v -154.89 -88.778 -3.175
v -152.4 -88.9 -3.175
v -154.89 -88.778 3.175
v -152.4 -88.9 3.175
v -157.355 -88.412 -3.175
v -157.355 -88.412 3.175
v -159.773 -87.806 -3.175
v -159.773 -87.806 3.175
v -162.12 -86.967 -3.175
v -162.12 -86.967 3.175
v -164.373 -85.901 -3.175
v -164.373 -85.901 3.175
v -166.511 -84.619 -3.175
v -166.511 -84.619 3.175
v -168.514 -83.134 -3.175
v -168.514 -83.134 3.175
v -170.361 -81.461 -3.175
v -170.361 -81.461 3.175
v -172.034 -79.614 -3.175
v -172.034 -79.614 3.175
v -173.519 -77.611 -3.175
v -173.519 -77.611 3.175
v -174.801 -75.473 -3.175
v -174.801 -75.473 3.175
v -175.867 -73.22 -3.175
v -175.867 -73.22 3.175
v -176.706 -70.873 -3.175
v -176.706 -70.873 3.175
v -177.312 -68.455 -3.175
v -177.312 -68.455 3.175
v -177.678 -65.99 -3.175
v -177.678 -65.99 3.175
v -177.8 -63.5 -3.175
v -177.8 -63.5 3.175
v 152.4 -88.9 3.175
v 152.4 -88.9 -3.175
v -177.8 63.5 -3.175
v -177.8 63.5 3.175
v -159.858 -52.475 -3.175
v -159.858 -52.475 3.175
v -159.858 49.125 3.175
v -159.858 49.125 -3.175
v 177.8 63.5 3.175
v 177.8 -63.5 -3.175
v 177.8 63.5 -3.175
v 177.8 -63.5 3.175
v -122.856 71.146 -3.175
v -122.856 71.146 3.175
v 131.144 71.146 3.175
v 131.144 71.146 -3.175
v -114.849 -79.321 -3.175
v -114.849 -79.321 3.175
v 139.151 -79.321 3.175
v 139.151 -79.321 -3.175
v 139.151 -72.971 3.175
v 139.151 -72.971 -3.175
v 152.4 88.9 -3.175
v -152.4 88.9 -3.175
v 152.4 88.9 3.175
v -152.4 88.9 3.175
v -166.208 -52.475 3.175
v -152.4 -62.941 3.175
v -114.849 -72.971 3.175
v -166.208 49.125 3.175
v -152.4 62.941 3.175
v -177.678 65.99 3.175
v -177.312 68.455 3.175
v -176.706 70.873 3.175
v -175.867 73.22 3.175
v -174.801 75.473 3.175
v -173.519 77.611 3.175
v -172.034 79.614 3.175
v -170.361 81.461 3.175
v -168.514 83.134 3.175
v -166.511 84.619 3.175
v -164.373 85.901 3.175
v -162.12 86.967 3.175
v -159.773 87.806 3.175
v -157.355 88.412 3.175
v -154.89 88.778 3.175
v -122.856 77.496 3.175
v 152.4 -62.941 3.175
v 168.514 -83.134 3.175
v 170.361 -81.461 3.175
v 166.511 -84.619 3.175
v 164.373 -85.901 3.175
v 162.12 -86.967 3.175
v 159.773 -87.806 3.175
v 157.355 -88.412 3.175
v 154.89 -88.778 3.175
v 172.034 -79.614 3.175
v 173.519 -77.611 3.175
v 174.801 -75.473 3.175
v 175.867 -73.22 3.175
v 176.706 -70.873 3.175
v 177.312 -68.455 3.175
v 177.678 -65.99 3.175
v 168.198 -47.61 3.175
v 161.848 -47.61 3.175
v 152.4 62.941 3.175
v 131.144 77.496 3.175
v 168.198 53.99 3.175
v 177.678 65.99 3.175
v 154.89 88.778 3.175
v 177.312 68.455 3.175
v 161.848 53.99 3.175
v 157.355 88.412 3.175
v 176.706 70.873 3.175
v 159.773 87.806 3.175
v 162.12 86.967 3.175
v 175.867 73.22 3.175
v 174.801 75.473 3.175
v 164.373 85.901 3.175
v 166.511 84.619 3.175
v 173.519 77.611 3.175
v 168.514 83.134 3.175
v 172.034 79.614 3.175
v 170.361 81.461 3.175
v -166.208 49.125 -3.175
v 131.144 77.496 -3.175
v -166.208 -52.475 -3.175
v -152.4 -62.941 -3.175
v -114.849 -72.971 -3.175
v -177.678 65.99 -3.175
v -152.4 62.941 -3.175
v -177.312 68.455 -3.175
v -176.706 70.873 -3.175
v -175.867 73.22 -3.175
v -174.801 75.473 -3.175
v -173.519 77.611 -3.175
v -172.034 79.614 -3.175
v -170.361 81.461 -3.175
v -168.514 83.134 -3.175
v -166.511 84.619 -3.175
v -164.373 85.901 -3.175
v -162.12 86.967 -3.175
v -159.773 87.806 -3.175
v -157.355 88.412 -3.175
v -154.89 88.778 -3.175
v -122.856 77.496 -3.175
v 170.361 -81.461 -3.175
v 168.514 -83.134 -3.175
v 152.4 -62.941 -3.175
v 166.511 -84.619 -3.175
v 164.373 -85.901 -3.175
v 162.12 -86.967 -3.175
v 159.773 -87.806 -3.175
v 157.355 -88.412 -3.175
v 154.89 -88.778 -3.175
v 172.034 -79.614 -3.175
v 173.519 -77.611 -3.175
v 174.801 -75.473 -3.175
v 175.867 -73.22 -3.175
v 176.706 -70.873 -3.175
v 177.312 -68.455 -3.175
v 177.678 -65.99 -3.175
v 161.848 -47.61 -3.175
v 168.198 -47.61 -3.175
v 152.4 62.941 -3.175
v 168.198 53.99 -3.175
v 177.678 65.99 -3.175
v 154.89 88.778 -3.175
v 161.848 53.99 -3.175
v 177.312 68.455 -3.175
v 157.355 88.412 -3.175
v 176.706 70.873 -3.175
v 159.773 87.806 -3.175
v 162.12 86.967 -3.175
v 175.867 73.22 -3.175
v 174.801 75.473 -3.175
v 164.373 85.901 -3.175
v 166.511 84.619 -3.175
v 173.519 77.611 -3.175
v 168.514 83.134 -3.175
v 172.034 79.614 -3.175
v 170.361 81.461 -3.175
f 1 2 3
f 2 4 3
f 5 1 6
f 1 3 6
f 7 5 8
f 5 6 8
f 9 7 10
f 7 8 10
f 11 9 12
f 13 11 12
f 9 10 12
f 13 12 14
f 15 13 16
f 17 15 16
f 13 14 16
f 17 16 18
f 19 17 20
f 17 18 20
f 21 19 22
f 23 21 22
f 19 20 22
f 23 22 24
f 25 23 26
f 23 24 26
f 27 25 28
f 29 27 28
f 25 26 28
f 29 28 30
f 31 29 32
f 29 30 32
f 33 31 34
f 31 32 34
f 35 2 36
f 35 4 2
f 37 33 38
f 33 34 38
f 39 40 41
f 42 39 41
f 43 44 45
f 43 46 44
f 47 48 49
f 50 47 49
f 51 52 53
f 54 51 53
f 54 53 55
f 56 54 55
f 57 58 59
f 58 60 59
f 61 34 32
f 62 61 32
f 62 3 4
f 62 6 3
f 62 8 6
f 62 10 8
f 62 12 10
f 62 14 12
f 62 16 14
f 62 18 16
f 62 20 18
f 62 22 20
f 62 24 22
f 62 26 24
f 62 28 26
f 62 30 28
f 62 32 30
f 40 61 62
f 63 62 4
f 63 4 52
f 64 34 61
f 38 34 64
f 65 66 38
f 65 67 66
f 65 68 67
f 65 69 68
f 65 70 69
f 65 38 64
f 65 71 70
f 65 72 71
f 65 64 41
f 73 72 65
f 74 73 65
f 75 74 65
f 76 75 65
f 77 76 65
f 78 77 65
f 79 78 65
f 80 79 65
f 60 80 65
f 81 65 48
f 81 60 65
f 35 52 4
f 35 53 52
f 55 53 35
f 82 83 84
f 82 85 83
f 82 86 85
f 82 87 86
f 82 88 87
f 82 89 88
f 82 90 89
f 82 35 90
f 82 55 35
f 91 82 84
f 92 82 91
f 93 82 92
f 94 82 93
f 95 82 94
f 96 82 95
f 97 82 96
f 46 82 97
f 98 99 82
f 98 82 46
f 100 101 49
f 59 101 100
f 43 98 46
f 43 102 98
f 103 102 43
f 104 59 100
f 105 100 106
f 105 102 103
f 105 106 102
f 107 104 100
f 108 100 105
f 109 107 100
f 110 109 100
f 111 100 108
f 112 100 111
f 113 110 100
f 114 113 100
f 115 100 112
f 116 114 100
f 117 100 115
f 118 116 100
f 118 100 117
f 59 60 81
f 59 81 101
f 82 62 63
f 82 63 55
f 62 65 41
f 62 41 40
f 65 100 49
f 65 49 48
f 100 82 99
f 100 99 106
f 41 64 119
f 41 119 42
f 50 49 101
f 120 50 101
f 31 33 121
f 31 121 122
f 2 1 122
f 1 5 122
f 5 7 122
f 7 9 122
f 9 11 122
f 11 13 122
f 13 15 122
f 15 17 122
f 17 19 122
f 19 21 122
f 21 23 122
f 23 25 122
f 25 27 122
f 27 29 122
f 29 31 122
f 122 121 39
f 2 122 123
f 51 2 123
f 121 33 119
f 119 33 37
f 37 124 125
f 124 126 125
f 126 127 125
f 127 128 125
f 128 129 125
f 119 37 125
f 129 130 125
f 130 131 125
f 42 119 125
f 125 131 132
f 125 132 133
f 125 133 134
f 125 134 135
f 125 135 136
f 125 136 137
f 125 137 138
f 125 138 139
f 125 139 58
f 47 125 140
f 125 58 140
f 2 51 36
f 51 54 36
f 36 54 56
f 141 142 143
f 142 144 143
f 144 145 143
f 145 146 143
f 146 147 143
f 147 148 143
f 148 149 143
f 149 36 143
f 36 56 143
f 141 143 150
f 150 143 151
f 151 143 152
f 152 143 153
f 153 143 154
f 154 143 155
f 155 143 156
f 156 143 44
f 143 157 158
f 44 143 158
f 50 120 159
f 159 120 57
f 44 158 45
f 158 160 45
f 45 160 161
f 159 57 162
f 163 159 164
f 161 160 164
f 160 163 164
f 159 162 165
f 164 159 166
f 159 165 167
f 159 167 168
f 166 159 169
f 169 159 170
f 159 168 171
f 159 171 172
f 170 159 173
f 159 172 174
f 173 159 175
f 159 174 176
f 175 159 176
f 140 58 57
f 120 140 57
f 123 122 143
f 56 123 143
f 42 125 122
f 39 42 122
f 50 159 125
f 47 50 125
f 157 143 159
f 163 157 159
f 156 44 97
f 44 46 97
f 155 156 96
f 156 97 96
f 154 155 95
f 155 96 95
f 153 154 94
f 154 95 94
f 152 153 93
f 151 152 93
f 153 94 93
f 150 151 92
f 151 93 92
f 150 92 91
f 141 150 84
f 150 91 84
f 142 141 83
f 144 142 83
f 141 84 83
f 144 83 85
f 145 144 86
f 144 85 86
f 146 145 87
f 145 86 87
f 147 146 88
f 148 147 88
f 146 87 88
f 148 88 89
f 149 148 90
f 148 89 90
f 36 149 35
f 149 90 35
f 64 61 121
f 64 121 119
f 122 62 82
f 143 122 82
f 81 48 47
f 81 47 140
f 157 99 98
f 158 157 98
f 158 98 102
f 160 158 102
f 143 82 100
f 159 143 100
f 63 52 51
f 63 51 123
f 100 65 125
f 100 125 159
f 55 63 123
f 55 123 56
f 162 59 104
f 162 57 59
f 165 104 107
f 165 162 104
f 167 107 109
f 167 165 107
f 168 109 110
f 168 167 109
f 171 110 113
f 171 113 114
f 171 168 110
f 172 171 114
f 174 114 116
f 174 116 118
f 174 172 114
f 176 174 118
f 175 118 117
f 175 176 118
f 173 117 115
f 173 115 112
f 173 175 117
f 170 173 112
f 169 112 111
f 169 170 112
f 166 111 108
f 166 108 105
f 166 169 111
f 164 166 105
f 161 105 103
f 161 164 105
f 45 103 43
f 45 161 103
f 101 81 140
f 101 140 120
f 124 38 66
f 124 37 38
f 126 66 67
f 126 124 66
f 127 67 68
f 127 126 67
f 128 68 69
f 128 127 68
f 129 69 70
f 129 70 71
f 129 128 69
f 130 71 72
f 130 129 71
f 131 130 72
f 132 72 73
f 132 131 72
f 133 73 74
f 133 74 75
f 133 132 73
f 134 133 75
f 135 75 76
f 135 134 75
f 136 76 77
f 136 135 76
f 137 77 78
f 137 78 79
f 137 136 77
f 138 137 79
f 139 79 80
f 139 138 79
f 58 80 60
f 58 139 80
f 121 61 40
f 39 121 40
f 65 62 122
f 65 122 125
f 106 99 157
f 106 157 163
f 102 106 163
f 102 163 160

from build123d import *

# Parameters (mm, degrees)
F0_W      = 304.8
F0_H      = 125.8824
F1_DEPTH  = 3.175
F2_W      = 355.6
F2_H      = 177.8
F3_DEPTH  = 3.175
F4_DEPTH  = 12.7
F5_R      = 25.4
F6_R      = 25.4
F7_R      = 25.4
F8_R      = 25.4
F9_W      = 254
F9_H      = 6.35
F10_DEPTH = 12.7
F11_W     = 254
F11_H     = 6.35
F12_DEPTH = 12.7
F13_W     = 6.35
F13_H     = 101.6
F14_DEPTH = 12.7
F15_W     = 6.35
F15_H     = 101.6
F16_DEPTH = 12.7


with BuildPart() as f1:
    # F0 (on Top) → F1 (new body, symmetric)
    with BuildSketch(Plane.XY):
        Rectangle(F0_W, F0_H)
    extrude(amount=F1_DEPTH, both=True)

    # F2 (on Top) → F3 (join, symmetric)
    with BuildSketch(Plane.XY):
        Rectangle(F2_W, F2_H)
    extrude(amount=F3_DEPTH, both=True)

    # F0 (on Top) → F4 (cut, symmetric)
    with BuildSketch(Plane.XY):
        Rectangle(F0_W, F0_H)
    extrude(amount=F4_DEPTH, both=True, mode=Mode.SUBTRACT)

    # F5
    f5_edges = [f1.edges().sort_by_distance(p)[0] for p in [
        (-177.8, 88.9, 0),
    ]]
    fillet(f5_edges, radius=F5_R)

    # F6
    f6_edges = [f1.edges().sort_by_distance(p)[0] for p in [
        (177.8, 88.9, 0),
    ]]
    fillet(f6_edges, radius=F6_R)

    # F7
    f7_edges = [f1.edges().sort_by_distance(p)[0] for p in [
        (177.8, -88.9, 0),
    ]]
    fillet(f7_edges, radius=F7_R)

    # F8
    f8_edges = [f1.edges().sort_by_distance(p)[0] for p in [
        (-177.8, -88.9, 0),
    ]]
    fillet(f8_edges, radius=F8_R)

    # F9 (on face) → F10 (cut, symmetric)
    with BuildSketch(Plane.XY):
        with Locations((4.1438912572, 74.3213535368)):
            Rectangle(F9_W, F9_H)
    extrude(amount=F10_DEPTH, both=True, mode=Mode.SUBTRACT)

    # F11 (on face) → F12 (cut, symmetric)
    with BuildSketch(Plane.XY):
        with Locations((12.1505002975, -76.146347177)):
            Rectangle(F11_W, F11_H)
    extrude(amount=F12_DEPTH, both=True, mode=Mode.SUBTRACT)

    # F13 (on face) → F14 (cut, symmetric)
    with BuildSketch(Plane.XY):
        with Locations((-163.0329436541, -1.6751059711)):
            Rectangle(F13_W, F13_H)
    extrude(amount=F14_DEPTH, both=True, mode=Mode.SUBTRACT)

    # F15 (on face) → F16 (cut, symmetric)
    with BuildSketch(Plane.XY):
        with Locations((165.0233619928, 3.1901380599)):
            Rectangle(F15_W, F15_H)
    extrude(amount=F16_DEPTH, both=True, mode=Mode.SUBTRACT)


solid = f1.part
